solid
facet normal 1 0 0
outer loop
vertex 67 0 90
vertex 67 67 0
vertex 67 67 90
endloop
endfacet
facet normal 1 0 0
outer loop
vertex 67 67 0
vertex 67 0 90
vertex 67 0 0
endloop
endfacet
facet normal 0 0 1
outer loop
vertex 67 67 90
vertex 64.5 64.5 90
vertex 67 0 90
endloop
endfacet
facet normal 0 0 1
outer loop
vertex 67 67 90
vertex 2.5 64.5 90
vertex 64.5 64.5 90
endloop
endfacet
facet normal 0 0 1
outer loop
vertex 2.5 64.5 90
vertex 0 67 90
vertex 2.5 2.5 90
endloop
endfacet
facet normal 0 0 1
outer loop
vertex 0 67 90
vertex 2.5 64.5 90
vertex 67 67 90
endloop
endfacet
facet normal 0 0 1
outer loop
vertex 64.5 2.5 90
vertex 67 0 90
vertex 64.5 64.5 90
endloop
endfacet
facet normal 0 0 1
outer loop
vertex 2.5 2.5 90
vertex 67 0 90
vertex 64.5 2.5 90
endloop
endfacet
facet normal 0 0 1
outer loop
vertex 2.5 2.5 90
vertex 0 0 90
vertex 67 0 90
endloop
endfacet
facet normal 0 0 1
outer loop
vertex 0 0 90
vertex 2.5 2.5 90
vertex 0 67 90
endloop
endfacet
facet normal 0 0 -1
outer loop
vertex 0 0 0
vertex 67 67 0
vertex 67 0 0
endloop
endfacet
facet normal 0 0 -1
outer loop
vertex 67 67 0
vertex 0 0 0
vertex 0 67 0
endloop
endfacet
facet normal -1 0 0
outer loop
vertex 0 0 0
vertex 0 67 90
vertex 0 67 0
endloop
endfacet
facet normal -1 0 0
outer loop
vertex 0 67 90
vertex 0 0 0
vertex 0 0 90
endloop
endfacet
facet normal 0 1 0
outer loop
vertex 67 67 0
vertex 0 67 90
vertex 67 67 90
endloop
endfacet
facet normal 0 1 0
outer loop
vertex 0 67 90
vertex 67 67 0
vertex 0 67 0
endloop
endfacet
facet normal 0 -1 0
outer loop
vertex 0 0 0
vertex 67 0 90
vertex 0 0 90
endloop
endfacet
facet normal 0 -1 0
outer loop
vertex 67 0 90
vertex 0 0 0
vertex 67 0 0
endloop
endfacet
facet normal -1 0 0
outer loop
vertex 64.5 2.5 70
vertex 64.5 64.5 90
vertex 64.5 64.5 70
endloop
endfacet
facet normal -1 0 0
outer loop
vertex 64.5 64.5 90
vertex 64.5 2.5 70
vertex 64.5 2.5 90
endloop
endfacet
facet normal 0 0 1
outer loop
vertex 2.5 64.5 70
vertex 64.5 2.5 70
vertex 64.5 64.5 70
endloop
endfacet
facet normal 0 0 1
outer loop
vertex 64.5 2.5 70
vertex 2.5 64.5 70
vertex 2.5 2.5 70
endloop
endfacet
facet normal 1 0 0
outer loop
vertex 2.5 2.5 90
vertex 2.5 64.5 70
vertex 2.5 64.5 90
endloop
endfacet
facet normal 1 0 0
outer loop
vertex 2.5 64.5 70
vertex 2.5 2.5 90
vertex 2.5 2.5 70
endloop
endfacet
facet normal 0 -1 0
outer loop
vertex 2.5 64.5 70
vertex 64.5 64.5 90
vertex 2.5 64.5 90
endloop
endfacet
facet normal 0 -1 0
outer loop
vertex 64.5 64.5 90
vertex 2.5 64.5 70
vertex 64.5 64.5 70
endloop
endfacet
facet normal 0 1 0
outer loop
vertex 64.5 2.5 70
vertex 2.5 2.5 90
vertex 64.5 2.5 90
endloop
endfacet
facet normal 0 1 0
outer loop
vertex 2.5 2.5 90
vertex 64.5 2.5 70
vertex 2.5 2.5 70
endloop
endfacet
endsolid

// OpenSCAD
difference()
{
  cube([67,67,90]);
  translate([2.5,2.5,70]) cube([62,62,30]);
}
